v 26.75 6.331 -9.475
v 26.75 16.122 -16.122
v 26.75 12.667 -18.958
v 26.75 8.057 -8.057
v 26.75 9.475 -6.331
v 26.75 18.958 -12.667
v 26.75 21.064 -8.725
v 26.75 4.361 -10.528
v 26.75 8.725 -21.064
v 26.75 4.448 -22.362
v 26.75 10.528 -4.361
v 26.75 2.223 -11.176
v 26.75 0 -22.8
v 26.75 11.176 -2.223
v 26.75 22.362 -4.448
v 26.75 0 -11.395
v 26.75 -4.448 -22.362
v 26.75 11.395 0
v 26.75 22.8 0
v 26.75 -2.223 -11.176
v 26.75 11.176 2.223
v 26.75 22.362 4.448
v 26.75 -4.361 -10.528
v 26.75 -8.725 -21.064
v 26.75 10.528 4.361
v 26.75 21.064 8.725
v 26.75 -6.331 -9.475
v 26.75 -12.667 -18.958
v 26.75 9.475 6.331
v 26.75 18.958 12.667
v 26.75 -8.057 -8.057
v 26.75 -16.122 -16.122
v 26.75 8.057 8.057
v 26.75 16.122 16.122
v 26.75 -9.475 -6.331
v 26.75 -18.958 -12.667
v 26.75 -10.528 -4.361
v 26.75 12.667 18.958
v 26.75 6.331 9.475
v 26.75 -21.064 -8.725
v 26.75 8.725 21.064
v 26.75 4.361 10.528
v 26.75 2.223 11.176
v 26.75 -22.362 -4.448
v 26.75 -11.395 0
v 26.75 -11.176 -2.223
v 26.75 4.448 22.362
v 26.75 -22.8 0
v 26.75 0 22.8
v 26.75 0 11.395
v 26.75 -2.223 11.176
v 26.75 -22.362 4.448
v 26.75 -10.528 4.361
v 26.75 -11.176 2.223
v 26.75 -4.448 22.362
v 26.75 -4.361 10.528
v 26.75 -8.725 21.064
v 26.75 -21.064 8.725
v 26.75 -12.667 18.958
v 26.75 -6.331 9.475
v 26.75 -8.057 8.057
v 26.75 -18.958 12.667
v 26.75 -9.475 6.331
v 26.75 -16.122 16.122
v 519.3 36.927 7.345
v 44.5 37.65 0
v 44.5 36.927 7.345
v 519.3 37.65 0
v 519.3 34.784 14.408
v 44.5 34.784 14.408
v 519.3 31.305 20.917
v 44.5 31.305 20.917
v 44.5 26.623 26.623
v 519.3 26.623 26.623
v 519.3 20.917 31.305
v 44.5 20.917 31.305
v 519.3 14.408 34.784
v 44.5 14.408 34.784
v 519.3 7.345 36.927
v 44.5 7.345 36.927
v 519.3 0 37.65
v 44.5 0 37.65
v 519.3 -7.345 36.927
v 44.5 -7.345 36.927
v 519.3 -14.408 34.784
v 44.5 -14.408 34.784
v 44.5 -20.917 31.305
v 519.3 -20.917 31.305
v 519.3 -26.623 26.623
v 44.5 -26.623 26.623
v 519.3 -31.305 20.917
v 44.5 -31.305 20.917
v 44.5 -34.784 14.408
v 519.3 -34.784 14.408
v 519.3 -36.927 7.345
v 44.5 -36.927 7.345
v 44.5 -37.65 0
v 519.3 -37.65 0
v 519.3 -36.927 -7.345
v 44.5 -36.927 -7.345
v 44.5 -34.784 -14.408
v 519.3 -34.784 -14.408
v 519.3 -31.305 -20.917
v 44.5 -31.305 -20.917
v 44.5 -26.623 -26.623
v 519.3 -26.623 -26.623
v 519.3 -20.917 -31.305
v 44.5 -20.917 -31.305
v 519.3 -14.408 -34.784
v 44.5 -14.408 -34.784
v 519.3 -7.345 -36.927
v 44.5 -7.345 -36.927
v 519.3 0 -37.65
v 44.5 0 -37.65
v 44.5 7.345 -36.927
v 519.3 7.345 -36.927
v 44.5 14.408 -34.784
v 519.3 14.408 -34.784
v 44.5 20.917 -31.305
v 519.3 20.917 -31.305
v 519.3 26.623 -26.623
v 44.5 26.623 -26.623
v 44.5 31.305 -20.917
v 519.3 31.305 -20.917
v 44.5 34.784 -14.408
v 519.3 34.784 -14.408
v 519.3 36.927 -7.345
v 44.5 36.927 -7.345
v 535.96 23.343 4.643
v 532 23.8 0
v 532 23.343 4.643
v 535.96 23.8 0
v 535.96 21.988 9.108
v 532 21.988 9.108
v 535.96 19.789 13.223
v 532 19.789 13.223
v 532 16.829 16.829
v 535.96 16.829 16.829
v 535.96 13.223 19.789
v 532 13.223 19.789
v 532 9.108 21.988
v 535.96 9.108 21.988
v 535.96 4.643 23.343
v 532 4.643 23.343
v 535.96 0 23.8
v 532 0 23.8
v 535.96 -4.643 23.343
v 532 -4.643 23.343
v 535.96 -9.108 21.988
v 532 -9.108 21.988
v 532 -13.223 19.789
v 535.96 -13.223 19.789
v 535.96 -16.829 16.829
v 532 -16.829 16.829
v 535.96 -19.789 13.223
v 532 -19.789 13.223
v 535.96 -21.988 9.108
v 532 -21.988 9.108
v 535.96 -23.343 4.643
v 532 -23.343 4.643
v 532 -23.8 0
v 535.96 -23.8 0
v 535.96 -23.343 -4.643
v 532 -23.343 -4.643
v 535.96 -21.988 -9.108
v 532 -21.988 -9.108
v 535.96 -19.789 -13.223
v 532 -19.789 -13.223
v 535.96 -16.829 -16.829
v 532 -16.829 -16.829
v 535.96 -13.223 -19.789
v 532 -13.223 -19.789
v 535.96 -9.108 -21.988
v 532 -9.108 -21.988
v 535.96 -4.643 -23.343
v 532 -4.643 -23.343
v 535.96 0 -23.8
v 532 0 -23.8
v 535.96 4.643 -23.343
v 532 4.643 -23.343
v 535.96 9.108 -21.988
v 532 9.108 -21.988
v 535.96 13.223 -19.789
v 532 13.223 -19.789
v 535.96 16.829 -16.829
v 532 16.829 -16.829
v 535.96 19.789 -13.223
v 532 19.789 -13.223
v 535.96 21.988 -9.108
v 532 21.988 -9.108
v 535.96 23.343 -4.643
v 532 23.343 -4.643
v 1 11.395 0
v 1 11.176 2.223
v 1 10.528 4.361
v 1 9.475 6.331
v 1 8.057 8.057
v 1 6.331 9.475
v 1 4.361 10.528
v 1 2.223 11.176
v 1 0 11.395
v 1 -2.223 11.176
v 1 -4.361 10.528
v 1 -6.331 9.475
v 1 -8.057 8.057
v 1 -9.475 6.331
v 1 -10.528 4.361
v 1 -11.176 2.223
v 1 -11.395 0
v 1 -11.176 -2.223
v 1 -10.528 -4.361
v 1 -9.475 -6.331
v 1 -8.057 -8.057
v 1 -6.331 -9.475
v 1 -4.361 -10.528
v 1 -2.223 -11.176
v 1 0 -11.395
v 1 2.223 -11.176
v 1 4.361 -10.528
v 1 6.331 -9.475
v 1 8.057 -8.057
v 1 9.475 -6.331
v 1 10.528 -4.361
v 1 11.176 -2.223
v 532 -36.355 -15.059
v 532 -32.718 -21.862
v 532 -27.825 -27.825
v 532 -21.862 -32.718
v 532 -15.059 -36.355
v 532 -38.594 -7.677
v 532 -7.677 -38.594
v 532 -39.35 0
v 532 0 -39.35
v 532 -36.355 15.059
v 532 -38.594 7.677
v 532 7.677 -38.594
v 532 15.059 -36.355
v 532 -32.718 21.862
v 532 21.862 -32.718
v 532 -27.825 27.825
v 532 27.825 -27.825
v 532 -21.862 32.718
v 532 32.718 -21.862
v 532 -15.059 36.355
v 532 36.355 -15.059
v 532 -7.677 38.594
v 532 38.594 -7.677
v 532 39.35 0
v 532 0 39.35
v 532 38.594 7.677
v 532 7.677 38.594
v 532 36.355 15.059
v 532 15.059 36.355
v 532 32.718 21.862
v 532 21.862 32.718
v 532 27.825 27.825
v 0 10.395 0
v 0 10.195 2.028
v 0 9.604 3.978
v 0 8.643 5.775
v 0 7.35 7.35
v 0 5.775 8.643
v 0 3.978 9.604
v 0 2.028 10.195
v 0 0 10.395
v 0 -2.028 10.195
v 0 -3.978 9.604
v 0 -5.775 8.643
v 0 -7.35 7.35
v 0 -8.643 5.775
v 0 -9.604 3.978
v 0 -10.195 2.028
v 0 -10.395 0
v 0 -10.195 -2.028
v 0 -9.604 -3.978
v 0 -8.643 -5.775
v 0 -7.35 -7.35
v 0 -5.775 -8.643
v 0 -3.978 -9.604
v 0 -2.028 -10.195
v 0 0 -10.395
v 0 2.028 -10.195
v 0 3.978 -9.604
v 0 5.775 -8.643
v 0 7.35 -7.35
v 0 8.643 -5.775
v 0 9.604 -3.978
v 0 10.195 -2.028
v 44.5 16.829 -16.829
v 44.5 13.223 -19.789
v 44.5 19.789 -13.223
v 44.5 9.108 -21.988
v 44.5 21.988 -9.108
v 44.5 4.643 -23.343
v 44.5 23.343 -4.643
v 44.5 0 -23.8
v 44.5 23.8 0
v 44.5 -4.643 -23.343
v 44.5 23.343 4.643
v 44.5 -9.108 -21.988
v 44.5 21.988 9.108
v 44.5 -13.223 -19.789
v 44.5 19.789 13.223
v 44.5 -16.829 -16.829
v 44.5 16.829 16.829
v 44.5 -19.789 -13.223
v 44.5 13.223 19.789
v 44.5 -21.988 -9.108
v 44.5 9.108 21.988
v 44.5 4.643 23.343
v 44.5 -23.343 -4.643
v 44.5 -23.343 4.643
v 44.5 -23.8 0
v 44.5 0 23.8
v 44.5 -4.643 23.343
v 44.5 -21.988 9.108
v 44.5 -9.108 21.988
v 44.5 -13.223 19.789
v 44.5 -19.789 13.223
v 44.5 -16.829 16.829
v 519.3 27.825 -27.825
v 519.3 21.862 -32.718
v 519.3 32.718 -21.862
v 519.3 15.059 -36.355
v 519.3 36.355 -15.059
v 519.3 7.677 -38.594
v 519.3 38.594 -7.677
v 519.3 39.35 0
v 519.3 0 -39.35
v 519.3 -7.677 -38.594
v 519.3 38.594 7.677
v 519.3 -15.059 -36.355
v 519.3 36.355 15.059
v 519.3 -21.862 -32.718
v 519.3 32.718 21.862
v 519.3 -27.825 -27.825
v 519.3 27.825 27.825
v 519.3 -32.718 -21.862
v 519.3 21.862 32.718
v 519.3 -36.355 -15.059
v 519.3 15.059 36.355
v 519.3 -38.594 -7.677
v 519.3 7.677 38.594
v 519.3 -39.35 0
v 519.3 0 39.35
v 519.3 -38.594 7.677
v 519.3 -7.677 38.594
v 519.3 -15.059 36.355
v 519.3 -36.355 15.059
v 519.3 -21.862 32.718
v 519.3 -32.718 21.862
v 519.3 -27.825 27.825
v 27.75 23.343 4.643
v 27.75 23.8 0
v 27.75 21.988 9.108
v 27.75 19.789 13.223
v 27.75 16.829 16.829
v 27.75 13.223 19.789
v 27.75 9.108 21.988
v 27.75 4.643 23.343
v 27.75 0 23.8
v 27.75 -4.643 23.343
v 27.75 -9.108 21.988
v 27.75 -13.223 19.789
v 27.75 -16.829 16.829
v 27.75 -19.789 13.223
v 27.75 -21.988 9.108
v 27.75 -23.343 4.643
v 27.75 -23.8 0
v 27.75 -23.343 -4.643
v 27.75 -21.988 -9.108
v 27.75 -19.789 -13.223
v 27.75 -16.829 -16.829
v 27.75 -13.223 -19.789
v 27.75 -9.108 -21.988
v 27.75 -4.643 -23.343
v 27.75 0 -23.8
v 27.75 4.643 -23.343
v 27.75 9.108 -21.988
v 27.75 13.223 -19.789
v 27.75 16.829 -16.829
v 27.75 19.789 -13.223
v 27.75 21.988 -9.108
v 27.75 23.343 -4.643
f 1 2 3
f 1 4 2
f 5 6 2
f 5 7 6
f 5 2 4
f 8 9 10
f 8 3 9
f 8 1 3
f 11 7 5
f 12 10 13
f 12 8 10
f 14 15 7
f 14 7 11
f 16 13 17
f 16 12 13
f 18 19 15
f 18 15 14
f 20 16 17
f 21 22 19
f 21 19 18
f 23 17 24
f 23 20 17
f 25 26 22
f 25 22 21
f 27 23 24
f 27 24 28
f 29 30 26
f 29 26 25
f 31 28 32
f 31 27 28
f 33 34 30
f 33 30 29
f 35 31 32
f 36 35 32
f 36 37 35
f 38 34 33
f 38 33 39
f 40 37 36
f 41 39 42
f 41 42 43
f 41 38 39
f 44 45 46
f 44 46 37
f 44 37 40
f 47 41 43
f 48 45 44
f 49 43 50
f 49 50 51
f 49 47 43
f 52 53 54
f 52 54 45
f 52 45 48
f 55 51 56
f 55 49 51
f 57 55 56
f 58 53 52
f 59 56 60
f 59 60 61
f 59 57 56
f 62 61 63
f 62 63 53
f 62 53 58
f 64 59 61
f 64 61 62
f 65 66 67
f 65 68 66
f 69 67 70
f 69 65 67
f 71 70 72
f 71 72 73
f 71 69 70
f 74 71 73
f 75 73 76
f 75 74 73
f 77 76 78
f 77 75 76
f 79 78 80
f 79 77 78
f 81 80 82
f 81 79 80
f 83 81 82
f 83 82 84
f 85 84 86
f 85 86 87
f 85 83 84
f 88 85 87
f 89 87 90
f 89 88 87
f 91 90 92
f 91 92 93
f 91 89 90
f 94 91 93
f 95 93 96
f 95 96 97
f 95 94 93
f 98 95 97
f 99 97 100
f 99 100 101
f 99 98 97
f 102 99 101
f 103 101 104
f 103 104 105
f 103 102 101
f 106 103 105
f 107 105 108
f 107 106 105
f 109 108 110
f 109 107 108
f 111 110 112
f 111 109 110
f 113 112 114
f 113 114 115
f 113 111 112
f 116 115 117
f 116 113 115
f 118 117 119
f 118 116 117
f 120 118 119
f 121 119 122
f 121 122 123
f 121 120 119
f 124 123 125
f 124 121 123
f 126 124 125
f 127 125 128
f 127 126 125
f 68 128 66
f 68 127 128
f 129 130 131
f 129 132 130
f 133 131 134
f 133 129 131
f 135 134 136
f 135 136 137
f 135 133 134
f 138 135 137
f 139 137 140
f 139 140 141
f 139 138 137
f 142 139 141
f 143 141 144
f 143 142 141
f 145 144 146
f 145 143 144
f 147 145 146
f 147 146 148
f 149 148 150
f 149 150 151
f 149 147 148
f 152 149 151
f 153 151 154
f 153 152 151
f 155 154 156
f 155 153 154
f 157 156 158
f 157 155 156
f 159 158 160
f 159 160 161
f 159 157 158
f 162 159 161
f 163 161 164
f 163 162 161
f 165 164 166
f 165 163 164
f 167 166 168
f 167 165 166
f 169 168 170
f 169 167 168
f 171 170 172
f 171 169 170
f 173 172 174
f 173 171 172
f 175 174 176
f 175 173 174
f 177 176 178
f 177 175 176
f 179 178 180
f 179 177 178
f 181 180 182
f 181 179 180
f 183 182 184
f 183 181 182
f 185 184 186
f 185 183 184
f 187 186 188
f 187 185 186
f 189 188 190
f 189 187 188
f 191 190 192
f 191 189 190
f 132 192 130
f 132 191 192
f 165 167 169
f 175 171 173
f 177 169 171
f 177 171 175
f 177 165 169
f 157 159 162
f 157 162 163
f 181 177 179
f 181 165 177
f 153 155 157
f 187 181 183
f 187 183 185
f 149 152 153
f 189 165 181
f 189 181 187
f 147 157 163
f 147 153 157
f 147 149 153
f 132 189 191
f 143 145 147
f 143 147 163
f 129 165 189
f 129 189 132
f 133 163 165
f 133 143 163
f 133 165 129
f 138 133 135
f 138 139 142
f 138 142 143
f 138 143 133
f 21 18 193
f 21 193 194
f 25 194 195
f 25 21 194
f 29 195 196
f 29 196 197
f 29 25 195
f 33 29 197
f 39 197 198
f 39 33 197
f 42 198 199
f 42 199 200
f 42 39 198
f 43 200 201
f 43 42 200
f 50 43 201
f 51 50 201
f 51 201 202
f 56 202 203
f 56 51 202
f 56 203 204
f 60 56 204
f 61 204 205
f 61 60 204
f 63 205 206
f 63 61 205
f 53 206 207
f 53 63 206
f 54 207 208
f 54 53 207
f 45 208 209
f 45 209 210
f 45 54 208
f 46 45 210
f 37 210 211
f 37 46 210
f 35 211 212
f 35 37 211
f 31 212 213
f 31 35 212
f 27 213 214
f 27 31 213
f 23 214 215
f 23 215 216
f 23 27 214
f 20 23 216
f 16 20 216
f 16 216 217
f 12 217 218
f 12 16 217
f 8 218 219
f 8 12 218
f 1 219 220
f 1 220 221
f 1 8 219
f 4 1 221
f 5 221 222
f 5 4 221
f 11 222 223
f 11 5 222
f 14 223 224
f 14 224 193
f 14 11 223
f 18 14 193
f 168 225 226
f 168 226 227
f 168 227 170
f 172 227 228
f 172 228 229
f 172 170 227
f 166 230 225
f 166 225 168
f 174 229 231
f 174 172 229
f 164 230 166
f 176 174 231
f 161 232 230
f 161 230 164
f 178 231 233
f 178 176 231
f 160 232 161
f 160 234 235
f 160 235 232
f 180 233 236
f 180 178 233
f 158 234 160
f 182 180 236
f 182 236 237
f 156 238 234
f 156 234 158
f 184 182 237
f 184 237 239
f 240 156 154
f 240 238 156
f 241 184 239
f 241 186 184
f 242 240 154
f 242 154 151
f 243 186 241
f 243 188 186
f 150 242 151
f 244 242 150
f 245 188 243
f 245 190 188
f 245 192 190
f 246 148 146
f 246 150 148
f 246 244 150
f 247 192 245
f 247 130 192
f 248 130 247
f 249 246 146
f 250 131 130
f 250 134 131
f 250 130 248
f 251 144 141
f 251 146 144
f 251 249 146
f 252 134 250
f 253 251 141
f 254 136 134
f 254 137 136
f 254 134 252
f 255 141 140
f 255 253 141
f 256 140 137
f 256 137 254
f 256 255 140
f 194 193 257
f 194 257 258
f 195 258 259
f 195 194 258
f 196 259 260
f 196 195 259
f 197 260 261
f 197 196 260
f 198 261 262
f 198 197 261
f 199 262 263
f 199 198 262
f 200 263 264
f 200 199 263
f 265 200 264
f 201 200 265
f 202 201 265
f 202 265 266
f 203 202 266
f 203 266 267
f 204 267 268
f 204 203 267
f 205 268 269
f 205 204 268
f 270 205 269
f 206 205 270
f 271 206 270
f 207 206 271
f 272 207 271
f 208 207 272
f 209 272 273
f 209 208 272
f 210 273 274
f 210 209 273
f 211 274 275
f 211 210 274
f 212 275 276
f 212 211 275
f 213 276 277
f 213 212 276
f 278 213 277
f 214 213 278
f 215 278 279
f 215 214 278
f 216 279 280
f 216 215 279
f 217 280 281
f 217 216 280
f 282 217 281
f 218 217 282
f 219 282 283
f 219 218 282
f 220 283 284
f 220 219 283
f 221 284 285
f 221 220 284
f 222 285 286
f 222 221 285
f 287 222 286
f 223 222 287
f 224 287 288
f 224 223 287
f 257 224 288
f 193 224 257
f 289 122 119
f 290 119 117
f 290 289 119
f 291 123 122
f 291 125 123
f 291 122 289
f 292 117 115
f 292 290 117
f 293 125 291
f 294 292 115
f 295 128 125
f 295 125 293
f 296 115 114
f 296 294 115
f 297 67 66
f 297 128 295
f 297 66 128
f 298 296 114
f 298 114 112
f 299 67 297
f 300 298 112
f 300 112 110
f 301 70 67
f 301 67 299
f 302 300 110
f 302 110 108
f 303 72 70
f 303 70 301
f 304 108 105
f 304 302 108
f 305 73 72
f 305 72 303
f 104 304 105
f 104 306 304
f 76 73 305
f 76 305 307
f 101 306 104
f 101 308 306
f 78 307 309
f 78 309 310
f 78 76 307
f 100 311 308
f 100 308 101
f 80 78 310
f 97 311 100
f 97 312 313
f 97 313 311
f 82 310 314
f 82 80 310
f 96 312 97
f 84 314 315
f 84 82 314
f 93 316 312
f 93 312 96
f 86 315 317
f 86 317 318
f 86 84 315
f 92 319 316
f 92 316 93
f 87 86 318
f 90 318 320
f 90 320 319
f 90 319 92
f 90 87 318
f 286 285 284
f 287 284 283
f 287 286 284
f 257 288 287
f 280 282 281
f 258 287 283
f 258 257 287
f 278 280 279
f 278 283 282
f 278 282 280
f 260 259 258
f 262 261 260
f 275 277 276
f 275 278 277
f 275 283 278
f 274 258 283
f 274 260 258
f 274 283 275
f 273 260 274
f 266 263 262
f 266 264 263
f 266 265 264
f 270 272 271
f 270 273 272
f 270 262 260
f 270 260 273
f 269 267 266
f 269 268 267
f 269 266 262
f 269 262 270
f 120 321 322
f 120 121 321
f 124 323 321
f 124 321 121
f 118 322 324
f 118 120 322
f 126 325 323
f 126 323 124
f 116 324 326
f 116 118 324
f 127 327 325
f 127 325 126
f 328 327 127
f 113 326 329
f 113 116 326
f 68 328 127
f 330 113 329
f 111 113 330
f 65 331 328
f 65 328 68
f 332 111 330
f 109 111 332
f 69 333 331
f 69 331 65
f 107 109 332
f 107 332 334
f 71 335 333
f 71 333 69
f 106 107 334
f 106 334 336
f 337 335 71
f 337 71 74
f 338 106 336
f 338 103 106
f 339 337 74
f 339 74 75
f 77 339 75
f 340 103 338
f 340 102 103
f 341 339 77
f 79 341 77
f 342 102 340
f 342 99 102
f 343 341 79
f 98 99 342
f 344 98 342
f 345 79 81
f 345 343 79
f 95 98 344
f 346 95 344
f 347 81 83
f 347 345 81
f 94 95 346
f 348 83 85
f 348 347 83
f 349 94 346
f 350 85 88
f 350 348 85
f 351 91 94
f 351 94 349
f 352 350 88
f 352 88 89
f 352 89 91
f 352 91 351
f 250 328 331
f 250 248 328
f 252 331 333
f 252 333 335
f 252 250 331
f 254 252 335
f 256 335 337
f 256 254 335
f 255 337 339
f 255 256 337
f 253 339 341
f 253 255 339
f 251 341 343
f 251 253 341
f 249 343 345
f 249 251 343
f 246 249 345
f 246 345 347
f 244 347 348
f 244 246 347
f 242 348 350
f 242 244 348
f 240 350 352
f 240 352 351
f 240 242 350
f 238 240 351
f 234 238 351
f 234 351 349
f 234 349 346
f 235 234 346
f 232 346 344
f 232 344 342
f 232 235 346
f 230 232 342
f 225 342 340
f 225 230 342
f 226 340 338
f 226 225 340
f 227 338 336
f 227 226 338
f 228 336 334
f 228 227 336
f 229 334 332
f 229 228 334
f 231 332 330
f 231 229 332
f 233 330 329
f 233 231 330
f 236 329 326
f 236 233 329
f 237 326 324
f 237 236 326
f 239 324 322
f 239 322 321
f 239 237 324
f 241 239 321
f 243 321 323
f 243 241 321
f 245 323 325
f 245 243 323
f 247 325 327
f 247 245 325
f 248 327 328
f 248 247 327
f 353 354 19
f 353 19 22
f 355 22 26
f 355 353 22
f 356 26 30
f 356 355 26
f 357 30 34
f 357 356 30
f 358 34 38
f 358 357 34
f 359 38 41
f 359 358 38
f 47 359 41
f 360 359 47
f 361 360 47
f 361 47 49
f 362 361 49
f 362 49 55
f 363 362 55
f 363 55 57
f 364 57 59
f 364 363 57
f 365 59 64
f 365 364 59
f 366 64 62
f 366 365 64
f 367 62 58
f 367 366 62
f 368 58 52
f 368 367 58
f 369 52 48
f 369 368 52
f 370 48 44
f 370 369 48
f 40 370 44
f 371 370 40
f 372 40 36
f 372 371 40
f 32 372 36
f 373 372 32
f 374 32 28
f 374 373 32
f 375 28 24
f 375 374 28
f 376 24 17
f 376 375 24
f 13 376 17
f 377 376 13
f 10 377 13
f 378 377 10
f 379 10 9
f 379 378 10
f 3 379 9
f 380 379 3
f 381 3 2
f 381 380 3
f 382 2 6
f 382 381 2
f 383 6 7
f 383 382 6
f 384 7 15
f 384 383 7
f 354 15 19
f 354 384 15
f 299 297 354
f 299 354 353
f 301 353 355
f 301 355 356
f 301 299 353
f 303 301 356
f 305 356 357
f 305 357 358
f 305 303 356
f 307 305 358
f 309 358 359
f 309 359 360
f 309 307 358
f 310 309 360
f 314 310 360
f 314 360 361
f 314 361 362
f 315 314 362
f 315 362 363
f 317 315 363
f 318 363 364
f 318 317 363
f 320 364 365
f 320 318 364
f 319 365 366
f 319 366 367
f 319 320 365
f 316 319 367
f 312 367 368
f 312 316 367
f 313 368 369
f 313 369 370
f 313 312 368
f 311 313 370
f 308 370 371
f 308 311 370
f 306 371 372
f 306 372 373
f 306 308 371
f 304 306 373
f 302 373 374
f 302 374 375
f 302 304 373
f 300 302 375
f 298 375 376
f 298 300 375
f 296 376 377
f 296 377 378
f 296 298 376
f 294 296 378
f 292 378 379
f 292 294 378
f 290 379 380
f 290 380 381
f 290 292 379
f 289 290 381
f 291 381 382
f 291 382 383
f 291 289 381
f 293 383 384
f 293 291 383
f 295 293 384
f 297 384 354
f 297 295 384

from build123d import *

# Parameters (mm, degrees)
CHANFREIN1_SIZE = 1


with BuildPart() as part:
    # Esquisse1 → Révolution1 (revolve)
    with BuildSketch(Plane.XY):
        Polygon((0, 0), (0, 11.395), (26.75, 11.395), (26.75, 23.8), (44.5, 23.8), (44.5, 37.65), (519.3, 37.65), (519.3, 39.35), (532, 39.35), (532, 23.8), (535.96, 23.8), (535.96, 0), align=None)
    revolve(axis=Axis((0, 0, 0), (1, 0, 0)))

    # Chanfrein1
    chanfrein1_edges = [part.edges().sort_by_distance(p)[0] for p in [
        (26.75, -23.8, 0),
        (0, -11.395, 0),
    ]]
    chamfer(chanfrein1_edges, length=CHANFREIN1_SIZE)


solid = part.part
